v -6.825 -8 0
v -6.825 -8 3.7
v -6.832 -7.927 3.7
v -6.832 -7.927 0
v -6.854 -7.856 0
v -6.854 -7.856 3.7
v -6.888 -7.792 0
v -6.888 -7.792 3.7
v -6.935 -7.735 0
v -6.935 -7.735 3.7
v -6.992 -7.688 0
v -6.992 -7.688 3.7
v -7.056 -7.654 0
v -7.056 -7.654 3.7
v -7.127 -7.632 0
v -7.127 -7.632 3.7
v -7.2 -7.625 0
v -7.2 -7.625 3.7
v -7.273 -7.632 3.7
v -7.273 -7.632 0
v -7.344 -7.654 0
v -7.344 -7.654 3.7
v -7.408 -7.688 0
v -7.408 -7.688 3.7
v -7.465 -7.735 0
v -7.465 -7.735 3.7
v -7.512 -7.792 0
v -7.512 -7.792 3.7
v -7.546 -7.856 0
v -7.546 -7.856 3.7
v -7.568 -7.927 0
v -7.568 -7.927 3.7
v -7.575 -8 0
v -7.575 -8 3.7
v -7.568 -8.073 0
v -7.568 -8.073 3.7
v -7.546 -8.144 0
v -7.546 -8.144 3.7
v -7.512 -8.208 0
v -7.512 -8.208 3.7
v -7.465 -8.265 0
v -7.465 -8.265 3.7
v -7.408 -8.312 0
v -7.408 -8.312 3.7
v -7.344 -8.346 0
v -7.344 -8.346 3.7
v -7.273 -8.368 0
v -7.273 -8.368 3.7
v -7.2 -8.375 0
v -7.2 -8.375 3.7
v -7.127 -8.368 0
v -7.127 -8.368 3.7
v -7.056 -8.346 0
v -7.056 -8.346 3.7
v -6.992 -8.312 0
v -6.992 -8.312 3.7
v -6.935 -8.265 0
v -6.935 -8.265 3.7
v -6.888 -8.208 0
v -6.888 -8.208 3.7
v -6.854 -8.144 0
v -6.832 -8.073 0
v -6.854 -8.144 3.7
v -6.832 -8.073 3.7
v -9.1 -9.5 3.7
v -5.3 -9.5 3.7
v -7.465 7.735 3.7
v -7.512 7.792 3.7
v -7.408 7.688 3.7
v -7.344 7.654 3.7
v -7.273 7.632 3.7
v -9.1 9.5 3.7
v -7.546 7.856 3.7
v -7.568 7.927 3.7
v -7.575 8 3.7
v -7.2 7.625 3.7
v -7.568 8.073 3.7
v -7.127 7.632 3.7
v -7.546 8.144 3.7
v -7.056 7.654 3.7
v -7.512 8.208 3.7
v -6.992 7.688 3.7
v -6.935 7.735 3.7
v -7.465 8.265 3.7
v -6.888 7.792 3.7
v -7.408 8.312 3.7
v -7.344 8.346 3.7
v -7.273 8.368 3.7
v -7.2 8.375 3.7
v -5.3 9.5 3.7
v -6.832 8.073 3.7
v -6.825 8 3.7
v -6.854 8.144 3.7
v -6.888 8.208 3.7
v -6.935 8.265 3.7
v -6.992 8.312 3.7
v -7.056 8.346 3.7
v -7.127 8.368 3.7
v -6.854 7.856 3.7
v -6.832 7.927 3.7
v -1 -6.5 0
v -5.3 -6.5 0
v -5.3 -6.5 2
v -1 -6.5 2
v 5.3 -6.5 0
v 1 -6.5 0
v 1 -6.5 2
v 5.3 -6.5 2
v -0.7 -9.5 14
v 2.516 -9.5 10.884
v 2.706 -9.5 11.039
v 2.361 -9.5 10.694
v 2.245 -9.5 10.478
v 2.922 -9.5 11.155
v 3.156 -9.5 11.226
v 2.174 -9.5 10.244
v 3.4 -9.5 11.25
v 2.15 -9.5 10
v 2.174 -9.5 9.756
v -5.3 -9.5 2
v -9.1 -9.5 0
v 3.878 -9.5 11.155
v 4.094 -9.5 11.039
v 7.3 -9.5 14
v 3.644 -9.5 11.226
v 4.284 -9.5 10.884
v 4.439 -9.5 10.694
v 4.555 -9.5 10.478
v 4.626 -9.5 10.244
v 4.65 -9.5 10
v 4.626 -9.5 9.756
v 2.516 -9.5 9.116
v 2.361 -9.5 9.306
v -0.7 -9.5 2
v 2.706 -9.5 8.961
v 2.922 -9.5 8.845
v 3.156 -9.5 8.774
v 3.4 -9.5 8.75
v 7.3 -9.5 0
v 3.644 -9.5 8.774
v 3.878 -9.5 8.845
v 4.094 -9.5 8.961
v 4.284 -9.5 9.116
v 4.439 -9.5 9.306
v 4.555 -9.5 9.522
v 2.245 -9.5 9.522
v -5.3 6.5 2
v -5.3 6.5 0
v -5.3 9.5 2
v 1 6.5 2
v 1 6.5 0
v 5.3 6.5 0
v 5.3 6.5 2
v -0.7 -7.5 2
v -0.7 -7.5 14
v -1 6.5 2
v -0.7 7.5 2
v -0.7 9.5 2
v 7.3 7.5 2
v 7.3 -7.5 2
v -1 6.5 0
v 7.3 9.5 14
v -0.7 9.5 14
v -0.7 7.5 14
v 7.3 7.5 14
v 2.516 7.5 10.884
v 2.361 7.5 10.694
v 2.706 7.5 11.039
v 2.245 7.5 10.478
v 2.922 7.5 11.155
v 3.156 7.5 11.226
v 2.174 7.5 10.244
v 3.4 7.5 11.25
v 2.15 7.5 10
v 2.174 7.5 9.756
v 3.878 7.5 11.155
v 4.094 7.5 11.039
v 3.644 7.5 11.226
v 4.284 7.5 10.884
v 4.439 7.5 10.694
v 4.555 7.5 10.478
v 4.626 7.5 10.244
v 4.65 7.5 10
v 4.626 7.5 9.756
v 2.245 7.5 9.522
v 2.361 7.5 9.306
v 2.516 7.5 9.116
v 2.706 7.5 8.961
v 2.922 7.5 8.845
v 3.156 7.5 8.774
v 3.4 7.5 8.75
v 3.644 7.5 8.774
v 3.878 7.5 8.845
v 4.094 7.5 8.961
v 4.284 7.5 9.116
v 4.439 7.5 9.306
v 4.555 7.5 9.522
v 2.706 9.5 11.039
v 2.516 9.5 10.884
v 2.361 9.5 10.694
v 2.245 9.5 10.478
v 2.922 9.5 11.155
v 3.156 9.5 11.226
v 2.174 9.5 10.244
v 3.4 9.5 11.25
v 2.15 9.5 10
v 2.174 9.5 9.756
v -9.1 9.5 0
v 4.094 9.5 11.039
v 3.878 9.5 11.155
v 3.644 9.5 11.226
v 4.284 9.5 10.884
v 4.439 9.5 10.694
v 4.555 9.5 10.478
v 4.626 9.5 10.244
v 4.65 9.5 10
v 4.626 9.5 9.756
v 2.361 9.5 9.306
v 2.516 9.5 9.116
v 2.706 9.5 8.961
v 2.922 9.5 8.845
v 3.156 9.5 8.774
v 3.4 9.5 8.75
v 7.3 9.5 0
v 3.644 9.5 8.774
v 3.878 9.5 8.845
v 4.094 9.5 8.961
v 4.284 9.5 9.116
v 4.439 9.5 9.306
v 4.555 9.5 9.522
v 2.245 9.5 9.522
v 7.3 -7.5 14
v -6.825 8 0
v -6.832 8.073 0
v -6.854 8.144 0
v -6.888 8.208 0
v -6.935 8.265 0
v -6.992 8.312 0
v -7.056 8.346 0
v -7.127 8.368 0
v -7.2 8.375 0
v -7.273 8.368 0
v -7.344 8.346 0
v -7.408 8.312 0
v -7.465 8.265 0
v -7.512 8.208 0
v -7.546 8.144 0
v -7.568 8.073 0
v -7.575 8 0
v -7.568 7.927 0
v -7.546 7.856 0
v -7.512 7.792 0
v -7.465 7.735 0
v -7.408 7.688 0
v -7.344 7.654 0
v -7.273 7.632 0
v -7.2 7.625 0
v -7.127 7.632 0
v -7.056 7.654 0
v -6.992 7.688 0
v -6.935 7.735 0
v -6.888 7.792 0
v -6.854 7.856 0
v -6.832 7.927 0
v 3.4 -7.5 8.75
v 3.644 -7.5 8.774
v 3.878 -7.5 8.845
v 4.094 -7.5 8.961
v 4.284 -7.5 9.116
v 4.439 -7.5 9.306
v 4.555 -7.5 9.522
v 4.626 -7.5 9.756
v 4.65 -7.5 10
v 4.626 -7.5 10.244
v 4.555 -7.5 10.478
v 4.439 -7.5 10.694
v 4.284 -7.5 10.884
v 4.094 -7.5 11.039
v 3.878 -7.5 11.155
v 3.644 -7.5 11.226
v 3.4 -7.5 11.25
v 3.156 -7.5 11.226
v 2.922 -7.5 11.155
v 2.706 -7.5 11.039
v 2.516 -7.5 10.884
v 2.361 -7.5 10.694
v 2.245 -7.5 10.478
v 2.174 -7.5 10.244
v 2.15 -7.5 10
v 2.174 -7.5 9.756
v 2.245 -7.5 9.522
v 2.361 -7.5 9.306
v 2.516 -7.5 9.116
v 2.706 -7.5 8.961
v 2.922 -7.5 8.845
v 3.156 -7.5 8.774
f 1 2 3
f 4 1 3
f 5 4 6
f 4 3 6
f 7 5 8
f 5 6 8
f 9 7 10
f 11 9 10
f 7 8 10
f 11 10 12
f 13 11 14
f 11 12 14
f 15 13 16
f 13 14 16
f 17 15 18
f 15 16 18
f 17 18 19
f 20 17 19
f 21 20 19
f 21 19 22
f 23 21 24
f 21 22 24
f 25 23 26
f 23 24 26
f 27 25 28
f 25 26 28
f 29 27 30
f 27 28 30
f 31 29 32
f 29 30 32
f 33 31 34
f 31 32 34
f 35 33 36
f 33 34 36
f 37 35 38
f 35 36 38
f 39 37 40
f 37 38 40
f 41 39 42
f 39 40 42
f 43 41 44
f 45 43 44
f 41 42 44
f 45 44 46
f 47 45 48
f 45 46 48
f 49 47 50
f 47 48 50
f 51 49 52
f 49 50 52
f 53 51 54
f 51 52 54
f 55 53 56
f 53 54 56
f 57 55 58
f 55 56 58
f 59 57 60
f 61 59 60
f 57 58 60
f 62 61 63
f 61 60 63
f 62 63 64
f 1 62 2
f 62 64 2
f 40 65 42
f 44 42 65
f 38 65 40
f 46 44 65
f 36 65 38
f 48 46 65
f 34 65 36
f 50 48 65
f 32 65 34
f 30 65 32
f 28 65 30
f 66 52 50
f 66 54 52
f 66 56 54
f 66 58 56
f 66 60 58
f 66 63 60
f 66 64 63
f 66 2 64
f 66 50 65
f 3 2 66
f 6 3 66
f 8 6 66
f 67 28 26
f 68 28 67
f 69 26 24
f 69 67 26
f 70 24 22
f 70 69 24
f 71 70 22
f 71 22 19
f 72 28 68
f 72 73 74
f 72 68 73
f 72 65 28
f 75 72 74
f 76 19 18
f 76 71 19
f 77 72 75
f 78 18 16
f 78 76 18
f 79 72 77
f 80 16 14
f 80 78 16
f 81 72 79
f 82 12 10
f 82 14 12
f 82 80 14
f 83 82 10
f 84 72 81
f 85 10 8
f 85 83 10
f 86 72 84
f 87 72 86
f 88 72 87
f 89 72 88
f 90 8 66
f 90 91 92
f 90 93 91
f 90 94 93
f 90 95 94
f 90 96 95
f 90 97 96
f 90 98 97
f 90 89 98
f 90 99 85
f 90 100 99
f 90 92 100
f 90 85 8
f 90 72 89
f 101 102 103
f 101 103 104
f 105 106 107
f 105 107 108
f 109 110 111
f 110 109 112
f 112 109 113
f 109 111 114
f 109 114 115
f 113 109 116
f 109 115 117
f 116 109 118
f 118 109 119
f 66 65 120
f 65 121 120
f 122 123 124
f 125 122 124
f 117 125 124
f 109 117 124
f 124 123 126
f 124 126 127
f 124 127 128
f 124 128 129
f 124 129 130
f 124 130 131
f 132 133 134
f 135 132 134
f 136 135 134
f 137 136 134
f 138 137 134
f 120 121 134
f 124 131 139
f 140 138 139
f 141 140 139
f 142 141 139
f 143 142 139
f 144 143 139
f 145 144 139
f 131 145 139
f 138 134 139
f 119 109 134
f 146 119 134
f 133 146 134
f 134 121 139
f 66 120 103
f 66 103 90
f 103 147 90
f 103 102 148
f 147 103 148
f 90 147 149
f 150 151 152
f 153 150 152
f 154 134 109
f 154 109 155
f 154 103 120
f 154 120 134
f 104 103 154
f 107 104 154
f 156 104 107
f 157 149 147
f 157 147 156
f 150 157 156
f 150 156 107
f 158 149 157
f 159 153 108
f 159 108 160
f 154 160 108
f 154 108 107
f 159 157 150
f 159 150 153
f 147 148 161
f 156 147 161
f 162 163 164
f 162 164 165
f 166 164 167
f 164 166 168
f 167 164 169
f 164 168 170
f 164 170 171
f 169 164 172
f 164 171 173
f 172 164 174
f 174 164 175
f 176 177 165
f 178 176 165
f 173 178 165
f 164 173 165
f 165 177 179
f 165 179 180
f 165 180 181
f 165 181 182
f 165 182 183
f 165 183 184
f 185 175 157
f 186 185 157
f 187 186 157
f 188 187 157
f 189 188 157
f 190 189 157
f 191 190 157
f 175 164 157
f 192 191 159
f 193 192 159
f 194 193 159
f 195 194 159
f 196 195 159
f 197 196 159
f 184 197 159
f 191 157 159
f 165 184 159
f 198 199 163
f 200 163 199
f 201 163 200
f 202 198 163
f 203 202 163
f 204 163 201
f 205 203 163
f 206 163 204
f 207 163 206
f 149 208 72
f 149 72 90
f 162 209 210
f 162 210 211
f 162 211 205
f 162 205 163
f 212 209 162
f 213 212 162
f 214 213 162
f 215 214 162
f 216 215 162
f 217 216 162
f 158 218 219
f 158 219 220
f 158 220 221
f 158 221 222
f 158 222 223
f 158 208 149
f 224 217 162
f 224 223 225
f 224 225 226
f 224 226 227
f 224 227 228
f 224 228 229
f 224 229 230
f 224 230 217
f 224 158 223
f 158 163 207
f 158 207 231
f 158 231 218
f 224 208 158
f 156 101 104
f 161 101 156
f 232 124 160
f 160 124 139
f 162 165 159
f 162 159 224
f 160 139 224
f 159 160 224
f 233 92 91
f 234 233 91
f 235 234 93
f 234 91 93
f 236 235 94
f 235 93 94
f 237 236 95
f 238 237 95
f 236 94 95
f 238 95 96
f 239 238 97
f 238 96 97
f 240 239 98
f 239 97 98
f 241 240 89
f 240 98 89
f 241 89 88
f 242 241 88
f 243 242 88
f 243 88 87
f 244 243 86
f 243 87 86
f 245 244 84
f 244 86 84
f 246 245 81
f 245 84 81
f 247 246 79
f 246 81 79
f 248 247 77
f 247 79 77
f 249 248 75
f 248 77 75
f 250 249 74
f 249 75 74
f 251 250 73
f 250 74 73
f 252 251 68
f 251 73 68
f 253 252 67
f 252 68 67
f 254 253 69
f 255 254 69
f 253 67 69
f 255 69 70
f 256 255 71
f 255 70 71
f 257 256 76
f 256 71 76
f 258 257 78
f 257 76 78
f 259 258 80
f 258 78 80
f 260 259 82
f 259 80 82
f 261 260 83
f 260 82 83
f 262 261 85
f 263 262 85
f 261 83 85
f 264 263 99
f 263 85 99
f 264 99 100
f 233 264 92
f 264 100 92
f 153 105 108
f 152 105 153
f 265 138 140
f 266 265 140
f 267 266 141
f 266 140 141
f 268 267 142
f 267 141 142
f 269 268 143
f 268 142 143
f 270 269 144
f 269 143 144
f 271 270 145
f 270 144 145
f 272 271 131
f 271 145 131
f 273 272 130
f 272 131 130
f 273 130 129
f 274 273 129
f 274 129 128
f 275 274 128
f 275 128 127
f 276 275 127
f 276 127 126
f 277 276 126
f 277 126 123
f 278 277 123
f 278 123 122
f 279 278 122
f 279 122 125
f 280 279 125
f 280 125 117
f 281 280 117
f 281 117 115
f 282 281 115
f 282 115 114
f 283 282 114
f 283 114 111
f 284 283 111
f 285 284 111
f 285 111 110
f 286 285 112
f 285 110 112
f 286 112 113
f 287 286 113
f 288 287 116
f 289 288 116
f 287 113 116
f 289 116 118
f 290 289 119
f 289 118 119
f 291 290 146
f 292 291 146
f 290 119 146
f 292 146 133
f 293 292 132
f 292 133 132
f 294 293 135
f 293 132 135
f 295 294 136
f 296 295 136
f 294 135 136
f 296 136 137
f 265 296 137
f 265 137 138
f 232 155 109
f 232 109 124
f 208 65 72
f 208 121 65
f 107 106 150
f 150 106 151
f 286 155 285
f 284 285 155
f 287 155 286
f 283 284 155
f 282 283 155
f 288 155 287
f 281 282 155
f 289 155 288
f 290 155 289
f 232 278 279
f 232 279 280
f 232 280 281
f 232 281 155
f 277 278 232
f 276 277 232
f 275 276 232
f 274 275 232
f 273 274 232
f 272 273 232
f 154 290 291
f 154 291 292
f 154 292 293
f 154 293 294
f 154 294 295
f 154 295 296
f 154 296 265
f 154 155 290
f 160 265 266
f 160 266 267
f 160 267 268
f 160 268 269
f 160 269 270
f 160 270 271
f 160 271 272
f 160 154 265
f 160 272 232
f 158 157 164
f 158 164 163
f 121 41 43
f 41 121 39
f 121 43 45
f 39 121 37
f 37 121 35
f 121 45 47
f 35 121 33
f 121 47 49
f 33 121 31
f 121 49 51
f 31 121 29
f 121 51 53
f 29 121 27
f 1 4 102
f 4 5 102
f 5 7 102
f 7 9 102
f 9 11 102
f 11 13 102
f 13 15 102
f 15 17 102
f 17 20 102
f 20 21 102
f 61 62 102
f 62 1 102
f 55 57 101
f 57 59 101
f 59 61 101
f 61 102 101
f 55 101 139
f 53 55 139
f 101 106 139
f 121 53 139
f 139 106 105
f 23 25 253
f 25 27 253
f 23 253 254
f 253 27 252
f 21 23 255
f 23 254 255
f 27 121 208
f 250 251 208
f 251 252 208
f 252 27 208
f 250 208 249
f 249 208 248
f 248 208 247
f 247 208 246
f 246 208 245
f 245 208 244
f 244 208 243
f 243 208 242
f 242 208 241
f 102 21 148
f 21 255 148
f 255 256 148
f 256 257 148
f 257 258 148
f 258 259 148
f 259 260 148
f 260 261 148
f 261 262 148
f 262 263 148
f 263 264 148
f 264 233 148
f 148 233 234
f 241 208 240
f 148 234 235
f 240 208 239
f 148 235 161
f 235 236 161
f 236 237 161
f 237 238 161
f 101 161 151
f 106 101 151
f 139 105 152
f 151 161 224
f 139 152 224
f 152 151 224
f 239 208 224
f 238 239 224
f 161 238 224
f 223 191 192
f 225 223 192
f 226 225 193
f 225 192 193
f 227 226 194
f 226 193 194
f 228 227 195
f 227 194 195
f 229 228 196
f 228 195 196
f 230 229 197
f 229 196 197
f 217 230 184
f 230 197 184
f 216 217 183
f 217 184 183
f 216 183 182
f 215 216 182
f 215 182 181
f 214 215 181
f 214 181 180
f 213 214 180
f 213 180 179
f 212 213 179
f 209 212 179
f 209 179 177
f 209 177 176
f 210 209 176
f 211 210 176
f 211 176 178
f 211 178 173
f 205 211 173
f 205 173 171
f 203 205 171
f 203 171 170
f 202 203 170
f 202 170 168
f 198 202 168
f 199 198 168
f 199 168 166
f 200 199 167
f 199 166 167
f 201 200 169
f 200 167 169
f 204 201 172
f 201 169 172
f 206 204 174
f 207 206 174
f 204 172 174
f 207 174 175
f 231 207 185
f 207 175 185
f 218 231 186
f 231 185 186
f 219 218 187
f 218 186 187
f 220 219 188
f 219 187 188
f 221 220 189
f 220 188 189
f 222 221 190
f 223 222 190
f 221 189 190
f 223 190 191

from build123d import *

# Parameters (mm, degrees)
SKETCH_2_W          = 16.4
SKETCH_2_H          = 19
SKETCH_2_W_2        = 4.3
SKETCH_2_H_2        = 13
EXTRUDE_1_DEPTH     = 2
SKETCH_3_W          = 8
SKETCH_3_H          = 2
EXTRUDE_2_DEPTH     = 12
SKETCH_10_W         = 3.8
SKETCH_10_H         = 19
EXTRUDE_4_DEPTH     = 1.7
CUT_EXTRUDE_START   = 1.7
SKETCH_9_R          = 0.375
CUT_EXTRUDE_2_DEPTH = 3.7
SKETCH_11_R         = 1.25
CUT_EXTRUDE_3_DEPTH = 26.294465798


with BuildPart() as part:
    # 草图2 → 凸台-拉伸1 (new body)
    with BuildSketch(Plane.XY):
        with Locations((-0.9, 0)):
            Rectangle(SKETCH_2_W, SKETCH_2_H)
        with Locations((-3.15, 0)):
            Rectangle(SKETCH_2_W_2, SKETCH_2_H_2, mode=Mode.SUBTRACT)
        with Locations((3.15, 0)):
            Rectangle(SKETCH_2_W_2, SKETCH_2_H_2, mode=Mode.SUBTRACT)
    extrude(amount=EXTRUDE_1_DEPTH)

    # 草图3 → 凸台-拉伸2 (add)
    with BuildSketch(Plane.XY.offset(2)):
        with Locations((3.3, 8.5)):
            Rectangle(SKETCH_3_W, SKETCH_3_H)
        with Locations((3.3, -8.5)):
            Rectangle(SKETCH_3_W, SKETCH_3_H)
    extrude(amount=EXTRUDE_2_DEPTH)

    # 草图10 → 凸台-拉伸4 (add)
    with BuildSketch(Plane.XY.offset(2)):
        with Locations((-7.2, 0)):
            Rectangle(SKETCH_10_W, SKETCH_10_H)
    extrude(amount=EXTRUDE_4_DEPTH)

    # 草图9 → 切除-拉伸2 (cut)
    with BuildSketch(Plane.XY.offset(2).offset(CUT_EXTRUDE_START)):
        with Locations((-7.2, 8)):
            Circle(SKETCH_9_R)
        with Locations((-7.2, -8)):
            Circle(SKETCH_9_R)
    extrude(amount=-CUT_EXTRUDE_2_DEPTH, mode=Mode.SUBTRACT)

    # 草图11 → 切除-拉伸3 (cut, through all)
    with BuildSketch(Plane.XZ.offset(9.5)):
        with Locations(Location((3.4, 10, 0), (0, 0, 270))):
            Circle(SKETCH_11_R)
    extrude(amount=-CUT_EXTRUDE_3_DEPTH, mode=Mode.SUBTRACT)


solid = part.part
